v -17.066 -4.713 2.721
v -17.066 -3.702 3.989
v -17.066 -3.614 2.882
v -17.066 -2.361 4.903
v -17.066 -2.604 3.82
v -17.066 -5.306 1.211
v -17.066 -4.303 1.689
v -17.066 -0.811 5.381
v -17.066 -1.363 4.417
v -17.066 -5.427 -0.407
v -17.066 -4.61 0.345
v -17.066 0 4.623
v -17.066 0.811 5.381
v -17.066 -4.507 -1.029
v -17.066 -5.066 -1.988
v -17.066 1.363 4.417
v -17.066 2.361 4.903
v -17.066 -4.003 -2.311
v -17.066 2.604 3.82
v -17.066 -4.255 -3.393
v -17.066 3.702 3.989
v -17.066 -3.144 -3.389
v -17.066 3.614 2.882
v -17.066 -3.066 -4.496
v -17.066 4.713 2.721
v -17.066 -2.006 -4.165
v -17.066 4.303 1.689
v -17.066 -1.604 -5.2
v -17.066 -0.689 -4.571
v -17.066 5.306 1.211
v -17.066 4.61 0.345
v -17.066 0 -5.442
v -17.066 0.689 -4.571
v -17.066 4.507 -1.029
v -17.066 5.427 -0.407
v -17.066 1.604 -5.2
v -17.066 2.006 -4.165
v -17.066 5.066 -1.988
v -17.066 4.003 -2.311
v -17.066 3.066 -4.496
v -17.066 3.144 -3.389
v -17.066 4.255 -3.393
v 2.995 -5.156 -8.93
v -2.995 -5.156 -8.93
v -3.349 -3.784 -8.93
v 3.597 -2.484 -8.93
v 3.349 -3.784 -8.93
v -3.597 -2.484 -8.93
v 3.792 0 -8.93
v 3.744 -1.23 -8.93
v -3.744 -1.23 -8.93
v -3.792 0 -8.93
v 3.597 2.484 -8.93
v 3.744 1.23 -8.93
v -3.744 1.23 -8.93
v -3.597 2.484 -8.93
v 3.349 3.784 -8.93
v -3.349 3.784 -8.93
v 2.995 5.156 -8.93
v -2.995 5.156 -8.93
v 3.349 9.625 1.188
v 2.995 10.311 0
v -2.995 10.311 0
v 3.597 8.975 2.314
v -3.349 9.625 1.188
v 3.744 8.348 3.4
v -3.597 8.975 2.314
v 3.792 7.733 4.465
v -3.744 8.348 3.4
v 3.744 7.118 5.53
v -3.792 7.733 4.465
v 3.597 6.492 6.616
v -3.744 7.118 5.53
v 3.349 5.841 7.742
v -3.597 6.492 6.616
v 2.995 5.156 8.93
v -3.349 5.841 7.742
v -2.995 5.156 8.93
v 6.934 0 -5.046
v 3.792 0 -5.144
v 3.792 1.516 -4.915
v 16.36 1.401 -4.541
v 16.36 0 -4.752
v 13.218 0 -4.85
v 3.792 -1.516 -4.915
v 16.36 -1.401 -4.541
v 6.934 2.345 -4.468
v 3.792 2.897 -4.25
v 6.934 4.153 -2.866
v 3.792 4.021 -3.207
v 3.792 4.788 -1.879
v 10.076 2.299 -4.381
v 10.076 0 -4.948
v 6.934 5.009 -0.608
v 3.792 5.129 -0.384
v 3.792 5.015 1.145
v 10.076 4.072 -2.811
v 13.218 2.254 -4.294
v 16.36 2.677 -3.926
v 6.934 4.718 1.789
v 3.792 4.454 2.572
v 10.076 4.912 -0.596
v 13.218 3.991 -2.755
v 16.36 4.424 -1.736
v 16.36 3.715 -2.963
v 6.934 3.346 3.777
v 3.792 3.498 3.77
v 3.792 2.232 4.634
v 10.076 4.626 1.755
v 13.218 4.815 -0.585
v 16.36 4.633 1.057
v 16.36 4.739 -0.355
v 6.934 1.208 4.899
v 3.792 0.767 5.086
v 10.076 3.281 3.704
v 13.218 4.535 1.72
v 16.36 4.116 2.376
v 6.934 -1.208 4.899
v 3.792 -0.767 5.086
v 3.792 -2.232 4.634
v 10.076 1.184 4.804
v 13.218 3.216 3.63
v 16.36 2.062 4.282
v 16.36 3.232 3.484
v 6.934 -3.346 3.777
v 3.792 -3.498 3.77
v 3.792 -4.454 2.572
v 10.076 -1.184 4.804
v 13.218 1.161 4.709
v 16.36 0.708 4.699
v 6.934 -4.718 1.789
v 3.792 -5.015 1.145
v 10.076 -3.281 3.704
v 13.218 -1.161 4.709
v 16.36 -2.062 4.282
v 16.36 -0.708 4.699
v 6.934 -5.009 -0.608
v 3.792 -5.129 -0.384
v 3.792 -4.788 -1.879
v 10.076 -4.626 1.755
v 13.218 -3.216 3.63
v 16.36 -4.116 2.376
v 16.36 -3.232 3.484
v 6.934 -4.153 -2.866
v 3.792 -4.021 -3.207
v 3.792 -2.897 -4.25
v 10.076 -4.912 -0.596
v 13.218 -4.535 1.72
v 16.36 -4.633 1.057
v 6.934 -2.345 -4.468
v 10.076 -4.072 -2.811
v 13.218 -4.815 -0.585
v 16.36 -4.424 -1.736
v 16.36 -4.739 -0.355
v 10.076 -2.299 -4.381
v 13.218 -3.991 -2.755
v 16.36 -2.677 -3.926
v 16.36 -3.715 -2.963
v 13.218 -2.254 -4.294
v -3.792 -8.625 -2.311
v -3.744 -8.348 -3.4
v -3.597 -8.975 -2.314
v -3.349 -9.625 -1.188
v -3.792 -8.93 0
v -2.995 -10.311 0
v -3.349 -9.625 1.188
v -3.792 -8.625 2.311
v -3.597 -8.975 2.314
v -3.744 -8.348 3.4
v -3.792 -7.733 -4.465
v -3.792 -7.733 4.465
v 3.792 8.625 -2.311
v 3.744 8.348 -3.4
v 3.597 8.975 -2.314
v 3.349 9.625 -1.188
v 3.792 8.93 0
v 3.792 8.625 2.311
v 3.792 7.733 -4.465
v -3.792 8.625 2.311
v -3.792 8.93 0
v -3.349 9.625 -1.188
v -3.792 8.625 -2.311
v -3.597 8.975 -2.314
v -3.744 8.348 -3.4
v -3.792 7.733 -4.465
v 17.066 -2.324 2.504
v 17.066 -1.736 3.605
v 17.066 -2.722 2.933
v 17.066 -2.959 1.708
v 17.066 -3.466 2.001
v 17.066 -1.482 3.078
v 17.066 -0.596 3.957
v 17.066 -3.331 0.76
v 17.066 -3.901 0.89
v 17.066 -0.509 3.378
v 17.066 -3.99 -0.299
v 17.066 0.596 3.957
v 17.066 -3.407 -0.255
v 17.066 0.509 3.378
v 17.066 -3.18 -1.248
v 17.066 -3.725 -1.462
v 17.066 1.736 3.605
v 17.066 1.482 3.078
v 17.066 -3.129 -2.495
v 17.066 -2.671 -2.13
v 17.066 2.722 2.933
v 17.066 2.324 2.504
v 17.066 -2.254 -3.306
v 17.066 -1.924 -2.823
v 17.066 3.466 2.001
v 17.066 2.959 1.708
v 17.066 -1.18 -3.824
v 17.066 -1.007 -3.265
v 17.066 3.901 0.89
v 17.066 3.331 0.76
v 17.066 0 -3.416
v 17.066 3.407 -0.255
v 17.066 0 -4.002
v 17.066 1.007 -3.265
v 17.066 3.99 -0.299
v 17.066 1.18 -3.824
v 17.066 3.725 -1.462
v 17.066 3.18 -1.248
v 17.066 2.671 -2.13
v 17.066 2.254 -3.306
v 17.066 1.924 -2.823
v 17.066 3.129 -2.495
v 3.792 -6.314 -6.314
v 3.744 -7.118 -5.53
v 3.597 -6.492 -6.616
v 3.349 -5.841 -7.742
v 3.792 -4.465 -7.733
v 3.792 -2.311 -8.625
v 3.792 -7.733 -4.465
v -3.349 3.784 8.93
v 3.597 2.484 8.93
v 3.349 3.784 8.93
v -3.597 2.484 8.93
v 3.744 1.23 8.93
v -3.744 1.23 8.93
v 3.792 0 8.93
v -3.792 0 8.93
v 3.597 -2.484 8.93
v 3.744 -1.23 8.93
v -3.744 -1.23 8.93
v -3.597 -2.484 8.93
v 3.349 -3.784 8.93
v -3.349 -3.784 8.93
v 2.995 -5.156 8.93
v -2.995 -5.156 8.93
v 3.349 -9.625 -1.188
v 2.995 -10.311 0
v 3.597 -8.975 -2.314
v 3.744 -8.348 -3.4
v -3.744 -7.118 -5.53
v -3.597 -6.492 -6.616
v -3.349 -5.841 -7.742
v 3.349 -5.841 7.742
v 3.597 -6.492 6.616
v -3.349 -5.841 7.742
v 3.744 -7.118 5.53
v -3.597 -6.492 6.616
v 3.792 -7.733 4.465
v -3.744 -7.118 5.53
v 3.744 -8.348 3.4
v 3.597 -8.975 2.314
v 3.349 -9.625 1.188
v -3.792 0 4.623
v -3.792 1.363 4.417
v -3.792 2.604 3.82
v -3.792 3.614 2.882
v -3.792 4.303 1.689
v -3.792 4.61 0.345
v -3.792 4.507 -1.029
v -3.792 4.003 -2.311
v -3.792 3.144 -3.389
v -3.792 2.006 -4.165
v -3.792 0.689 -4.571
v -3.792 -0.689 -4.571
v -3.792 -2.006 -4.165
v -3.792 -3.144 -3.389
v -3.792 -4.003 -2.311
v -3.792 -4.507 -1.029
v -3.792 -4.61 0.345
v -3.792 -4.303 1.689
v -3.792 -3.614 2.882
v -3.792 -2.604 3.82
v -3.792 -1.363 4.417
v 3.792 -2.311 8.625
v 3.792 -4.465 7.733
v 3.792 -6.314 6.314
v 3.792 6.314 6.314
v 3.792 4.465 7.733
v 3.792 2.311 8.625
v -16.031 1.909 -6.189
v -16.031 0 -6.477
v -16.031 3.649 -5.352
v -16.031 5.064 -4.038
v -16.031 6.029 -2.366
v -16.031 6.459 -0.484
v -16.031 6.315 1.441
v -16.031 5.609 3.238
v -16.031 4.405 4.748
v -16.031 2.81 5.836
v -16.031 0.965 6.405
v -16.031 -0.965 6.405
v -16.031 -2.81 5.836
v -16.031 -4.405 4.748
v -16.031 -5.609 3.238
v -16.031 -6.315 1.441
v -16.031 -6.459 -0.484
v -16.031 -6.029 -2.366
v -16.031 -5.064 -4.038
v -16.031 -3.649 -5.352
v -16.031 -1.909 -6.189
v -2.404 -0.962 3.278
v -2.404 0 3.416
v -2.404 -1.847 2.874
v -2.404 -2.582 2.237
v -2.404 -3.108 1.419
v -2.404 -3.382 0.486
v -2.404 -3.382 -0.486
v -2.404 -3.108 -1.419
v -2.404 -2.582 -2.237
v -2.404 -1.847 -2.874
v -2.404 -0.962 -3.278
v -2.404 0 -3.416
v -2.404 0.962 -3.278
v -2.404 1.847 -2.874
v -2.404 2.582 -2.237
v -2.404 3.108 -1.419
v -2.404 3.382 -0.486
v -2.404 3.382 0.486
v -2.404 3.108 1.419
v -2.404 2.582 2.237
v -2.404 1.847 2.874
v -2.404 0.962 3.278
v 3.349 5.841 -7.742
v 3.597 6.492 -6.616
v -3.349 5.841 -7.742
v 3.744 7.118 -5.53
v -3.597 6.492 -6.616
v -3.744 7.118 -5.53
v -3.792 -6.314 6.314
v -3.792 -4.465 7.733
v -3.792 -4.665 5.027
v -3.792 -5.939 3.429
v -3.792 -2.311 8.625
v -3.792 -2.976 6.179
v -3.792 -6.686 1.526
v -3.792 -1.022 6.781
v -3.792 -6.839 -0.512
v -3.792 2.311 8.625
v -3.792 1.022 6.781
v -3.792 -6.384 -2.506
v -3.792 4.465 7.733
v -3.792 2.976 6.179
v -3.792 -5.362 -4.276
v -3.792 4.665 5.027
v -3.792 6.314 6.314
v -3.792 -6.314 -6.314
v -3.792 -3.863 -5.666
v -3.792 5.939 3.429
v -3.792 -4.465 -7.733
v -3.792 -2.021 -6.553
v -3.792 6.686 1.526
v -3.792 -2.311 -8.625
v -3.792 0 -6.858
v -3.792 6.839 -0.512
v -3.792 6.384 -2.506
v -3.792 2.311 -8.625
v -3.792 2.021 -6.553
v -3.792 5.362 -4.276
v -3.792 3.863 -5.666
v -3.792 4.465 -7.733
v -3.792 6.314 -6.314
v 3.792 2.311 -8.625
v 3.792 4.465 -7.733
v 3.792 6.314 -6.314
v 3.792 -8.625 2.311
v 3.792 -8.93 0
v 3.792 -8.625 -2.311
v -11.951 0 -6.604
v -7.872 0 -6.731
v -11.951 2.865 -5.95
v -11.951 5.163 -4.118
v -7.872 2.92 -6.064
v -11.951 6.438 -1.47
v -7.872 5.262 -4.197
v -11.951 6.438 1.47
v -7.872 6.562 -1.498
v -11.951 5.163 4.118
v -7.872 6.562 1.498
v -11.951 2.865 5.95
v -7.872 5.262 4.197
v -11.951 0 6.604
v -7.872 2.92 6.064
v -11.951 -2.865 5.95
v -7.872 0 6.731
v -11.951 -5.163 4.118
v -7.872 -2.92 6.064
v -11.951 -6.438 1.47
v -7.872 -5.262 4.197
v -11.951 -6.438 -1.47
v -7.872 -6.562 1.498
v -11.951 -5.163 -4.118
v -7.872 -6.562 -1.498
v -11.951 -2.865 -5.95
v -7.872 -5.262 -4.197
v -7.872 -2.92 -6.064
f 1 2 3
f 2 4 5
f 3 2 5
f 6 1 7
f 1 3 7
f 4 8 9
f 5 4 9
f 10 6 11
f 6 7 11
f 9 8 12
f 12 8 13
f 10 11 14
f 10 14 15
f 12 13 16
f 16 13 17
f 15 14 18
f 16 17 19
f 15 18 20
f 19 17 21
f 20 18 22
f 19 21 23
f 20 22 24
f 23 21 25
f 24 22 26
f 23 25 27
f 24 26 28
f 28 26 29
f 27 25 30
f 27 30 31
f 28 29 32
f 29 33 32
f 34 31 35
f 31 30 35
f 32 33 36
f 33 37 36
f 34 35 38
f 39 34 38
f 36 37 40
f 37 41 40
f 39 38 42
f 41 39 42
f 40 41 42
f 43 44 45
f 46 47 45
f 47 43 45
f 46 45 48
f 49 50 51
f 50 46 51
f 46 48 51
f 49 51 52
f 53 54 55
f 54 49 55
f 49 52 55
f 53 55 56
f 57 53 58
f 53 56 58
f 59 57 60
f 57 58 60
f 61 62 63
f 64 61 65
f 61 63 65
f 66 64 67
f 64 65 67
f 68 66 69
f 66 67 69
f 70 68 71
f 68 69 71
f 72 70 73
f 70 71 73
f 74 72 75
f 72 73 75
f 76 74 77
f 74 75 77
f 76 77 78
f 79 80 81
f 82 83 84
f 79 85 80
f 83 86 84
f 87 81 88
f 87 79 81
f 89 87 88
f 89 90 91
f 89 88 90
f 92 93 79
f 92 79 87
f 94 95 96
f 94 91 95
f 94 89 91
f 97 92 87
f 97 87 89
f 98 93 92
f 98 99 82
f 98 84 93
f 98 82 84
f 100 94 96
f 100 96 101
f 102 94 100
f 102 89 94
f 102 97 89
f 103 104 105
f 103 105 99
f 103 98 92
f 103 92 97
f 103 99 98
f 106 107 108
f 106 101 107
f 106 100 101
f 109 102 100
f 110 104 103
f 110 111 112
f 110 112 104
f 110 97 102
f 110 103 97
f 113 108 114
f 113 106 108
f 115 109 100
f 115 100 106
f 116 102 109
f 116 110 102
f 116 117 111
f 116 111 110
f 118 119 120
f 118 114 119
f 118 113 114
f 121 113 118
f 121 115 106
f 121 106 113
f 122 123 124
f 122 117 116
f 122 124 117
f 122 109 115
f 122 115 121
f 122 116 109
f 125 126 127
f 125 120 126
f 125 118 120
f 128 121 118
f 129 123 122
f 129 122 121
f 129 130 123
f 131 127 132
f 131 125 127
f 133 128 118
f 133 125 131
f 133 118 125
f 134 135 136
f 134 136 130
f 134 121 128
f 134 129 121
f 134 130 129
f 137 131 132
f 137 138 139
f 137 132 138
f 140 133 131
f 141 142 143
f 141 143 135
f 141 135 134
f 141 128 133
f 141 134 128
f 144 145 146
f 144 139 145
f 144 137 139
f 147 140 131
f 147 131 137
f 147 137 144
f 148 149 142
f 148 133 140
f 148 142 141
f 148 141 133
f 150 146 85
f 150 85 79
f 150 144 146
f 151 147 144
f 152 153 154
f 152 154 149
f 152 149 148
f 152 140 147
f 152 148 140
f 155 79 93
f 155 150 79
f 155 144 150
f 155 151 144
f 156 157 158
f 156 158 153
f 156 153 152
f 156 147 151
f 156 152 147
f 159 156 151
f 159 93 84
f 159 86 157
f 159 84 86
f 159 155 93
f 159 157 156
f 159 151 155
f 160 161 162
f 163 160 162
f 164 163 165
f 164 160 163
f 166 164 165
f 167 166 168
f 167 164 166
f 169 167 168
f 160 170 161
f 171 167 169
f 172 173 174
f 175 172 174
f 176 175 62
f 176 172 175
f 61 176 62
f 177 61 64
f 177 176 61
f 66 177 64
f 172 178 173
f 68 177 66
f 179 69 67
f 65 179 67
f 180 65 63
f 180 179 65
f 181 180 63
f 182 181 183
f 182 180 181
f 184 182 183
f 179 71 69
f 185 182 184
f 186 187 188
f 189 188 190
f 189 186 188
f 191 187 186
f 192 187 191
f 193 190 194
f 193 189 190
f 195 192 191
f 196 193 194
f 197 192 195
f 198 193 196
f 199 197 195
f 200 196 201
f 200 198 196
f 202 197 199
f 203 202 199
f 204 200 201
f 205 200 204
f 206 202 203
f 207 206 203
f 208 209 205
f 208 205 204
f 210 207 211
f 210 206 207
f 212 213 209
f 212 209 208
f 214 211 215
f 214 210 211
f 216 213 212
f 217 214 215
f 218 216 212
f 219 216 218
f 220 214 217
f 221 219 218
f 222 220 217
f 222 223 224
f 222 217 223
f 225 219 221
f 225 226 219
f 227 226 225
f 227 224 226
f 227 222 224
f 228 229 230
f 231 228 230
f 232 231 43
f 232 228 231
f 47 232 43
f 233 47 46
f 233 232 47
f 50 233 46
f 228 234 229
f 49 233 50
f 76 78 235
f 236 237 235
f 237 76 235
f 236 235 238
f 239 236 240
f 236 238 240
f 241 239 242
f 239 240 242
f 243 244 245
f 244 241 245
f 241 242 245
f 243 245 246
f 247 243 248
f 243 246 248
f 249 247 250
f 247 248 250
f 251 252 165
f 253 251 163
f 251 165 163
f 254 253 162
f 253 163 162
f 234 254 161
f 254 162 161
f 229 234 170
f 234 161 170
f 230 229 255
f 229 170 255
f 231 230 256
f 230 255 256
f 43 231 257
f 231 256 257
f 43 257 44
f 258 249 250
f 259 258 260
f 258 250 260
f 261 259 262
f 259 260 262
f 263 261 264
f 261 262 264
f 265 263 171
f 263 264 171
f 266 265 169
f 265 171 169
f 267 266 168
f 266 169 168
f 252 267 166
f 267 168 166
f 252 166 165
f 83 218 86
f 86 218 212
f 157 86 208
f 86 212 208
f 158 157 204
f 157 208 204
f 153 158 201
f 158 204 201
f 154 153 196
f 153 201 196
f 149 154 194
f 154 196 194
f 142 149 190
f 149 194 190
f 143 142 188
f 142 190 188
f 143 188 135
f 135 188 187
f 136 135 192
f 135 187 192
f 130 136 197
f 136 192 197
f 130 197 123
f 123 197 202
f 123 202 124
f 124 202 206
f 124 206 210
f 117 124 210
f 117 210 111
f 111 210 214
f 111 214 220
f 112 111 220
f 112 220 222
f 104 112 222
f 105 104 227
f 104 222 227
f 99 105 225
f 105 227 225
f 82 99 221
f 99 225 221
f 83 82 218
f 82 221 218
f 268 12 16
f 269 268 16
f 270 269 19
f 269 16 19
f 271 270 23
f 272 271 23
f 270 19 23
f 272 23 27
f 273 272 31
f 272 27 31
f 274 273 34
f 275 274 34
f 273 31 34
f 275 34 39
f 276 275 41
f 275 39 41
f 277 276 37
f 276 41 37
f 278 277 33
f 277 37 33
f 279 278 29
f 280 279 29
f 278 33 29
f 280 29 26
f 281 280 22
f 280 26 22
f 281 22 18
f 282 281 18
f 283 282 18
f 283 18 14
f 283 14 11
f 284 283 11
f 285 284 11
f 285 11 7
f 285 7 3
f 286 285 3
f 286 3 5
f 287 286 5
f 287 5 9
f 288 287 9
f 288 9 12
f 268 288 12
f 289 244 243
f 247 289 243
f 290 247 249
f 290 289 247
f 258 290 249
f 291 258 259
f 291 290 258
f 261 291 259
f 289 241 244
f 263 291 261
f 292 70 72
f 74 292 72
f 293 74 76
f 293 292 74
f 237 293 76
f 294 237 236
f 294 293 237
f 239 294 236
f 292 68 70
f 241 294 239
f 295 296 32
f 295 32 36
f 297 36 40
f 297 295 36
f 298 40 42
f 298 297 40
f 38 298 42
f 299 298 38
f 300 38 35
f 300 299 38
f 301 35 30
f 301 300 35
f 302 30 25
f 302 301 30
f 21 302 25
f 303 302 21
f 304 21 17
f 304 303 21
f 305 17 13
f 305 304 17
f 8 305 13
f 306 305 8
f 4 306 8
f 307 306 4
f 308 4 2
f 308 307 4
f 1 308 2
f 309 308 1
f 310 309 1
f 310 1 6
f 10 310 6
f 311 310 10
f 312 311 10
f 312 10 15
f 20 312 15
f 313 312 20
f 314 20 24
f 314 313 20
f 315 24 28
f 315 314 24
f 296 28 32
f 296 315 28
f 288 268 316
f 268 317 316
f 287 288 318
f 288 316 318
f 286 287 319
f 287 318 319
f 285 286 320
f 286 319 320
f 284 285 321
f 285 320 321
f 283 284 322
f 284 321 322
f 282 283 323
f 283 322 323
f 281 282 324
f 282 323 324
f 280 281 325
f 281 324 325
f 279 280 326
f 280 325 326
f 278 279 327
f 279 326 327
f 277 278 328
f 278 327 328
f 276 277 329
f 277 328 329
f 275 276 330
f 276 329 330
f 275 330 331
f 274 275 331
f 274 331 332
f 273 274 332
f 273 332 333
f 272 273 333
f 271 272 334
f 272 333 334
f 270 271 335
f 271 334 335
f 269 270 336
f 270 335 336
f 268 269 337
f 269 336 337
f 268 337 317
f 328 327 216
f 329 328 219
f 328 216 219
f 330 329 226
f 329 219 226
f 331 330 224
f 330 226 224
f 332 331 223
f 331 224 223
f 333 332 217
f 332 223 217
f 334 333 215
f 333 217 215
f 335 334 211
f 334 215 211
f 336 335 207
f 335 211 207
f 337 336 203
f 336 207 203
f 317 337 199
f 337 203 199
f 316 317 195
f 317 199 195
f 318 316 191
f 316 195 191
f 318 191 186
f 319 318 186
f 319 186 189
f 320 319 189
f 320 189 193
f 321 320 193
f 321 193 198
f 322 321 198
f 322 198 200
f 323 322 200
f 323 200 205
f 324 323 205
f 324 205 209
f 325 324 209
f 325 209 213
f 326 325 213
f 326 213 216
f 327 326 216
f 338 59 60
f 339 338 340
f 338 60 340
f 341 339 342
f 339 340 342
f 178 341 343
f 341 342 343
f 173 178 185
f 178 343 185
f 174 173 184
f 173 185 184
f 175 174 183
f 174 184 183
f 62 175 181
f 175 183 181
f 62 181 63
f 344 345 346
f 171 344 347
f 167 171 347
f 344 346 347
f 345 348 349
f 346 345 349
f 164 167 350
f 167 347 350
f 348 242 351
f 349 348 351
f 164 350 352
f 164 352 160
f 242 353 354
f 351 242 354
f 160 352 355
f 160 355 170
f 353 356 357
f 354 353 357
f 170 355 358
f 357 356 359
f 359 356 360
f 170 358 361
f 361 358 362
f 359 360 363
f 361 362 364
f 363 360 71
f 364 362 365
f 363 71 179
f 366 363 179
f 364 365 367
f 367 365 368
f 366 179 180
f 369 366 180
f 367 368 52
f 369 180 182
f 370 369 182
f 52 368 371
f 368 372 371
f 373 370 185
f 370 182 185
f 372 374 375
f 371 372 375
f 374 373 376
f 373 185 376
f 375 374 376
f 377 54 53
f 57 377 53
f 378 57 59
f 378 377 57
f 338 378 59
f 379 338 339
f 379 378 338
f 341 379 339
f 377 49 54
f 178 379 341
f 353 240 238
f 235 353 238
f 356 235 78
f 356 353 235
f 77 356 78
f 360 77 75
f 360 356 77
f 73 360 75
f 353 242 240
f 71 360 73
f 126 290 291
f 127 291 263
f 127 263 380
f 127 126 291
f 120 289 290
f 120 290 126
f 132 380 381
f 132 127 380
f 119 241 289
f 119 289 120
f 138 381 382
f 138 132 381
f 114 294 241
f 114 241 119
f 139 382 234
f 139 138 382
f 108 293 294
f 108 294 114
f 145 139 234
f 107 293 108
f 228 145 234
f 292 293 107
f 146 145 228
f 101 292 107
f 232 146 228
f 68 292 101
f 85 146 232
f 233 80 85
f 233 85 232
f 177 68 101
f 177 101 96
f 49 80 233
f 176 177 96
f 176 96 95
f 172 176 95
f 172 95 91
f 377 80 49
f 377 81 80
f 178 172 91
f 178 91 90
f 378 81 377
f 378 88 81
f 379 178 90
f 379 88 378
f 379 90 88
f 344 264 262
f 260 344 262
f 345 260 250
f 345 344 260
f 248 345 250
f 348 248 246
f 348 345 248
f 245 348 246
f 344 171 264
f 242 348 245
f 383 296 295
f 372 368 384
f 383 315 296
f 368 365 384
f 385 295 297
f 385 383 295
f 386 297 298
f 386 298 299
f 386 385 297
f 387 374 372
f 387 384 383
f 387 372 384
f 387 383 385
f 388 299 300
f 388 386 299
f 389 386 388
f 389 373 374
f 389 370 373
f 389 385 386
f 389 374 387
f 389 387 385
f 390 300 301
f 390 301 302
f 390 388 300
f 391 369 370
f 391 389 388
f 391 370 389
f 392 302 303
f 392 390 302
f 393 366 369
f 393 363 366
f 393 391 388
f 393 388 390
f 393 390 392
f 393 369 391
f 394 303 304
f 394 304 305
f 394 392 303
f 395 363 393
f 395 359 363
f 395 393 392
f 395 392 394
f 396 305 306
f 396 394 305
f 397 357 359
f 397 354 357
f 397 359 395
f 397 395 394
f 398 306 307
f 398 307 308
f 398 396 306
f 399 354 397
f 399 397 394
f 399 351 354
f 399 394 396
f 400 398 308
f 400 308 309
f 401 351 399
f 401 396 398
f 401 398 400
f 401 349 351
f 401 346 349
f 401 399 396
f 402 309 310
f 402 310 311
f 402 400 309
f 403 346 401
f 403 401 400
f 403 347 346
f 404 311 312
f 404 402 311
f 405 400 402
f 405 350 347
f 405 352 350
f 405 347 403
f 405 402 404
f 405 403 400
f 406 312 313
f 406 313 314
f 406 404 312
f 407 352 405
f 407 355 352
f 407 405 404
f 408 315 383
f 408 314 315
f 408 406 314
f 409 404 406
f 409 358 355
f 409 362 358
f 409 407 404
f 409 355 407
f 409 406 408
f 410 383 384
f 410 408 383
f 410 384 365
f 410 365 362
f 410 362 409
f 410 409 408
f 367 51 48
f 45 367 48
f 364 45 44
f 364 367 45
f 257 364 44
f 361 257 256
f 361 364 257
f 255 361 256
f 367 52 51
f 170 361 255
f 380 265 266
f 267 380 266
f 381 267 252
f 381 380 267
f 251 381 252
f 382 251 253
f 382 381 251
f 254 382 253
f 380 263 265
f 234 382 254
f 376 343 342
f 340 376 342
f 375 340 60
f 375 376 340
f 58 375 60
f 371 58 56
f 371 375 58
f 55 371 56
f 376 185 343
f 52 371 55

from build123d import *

# Parameters (mm, degrees)
SKETCH2_R           = 6.858
EXTRUDE1_DEPTH      = 13.273264
EXTRUDE1_DRAFT      = -1.783333333
CHAMFER1_SIZE       = 1.002631579
CHAMFER1_SIZE2      = 1.035353254
SKETCH5_R           = 5.1435
EXTRUDE2_DEPTH      = 13.273264
EXTRUDE2_TAPER      = 1.783333333
CHAMFER2_SIZE       = 0.705555556
CHAMFER2_SIZE_2     = 0.728581919
EXTRUDE3_DEPTH      = 3.792361
EXTRUDE3_DEPTH_BACK = 3.792361
SKETCH10_OUTSIDE_W  = 118.396
SKETCH10_OUTSIDE_H  = 121.158
SKETCH10_OUTSIDE_R  = 8.9296875
CUT_EXTRUDE1_DEPTH  = 25.922158813
CUT_EXTRUDE1_DRAFT  = -60
SKETCH11_OUTSIDE_W  = 118.396
SKETCH11_OUTSIDE_H  = 121.158
SKETCH11_OUTSIDE_R  = 8.9296875
CUT_EXTRUDE2_DEPTH  = 25.922158813
CUT_EXTRUDE2_DRAFT  = -60
SKETCH12_R          = 4.6228
CUT_EXTRUDE3_DEPTH  = 13.273265
SKETCH13_R          = 3.4163
CUT_EXTRUDE4_DEPTH  = 37.75596067


with BuildPart() as part:
    # Sketch2 → Extrude1 (with draft: the straight prism first)
    with BuildSketch(Plane(origin=(-3.792361111, 0, 0), x_dir=(0, 0, -1), z_dir=(1, 0, 0))):
        Circle(SKETCH2_R)
    extrude(amount=-EXTRUDE1_DEPTH)
    # Extrude1: the draft: its side faces are tilted about the plane it starts from
    extrude1_sides = [part.faces().sort_by_distance(p)[0] for p in [
        (-10.428993111, 0, 6.858),
    ]]
    draft(extrude1_sides, Plane(origin=(-3.792361111, 0, 0), x_dir=(0, 0, -1), z_dir=(1, 0, 0)), EXTRUDE1_DRAFT)

    # Chamfer1
    chamfer1_edges = [part.edges().sort_by_distance(p)[0] for p in [
        (-17.065625111, 0, 6.444735688),
    ]]
    chamfer1_side = [part.faces().sort_by_distance(p)[0] for p in [
        (-17.065625111, 0, 0),
    ]]
    chamfer(chamfer1_edges, length=CHAMFER1_SIZE, length2=CHAMFER1_SIZE2, reference=chamfer1_side[0])



with BuildPart() as body_2:
    # Sketch5 → Extrude2 (new body)
    with BuildSketch(Plane(origin=(3.792361111, 0, 0), x_dir=(0, 0, -1), z_dir=(1, 0, 0))):
        Circle(SKETCH5_R)
    extrude(amount=EXTRUDE2_DEPTH, taper=EXTRUDE2_TAPER)

    # Chamfer2
    # the kernel refuses this chamfer: 0.728581919, 0.705555556 mm, written as the material it takes off along each edge
    with BuildSketch(Plane(origin=(17.065625111, 0, 0), x_dir=(0, 0, -1), z_dir=(0, 1, 0))) as chamfer2_piece_1:
        Polygon((4.730235688 + CHAMFER2_SIZE * 0.0311200130608, CHAMFER2_SIZE * 0.999515654468), (4.730235688 - CHAMFER2_SIZE_2, 0), (4.730235688, 0), align=None)
    revolve(axis=Axis((17.065625111, 0, 0), (-1, 0, 0)), mode=Mode.SUBTRACT)


with BuildPart() as part_1:
    add(part.part)

    add(body_2.part)  # Revolve1 merges body 2
    # Sketch8 → Revolve1 (revolve)
    with BuildSketch(Plane.XY, mode=Mode.PRIVATE) as revolve1_sk:
        Polygon((0, 6.858), (-3.792361111, 6.858), (-10.476571637, 5.066971187), (-10.476571637, 0), (10.476571637, 0), (10.476571637, 3.352471187), (3.792361111, 5.1435), (0, 5.1435), align=None)
    revolve(revolve1_sk.sketch.rotate(Axis((-17.065625, 0, 0), (1, 0, 0)), 90), axis=Axis((-17.065625, 0, 0), (1, 0, 0)))

    # Sketch9 → Extrude3 (add, two sides: drawn at the far end of the back side and taken through both)
    with BuildSketch(Plane(origin=(0, 0, 0), x_dir=(0, 0, -1), z_dir=(1, 0, 0)).offset(-EXTRUDE3_DEPTH_BACK)):
        Polygon((0, 10.311114964), (-8.9296875, 5.155557482), (-8.9296875, -5.155557482), (0, -10.311114964), (8.9296875, -5.155557482), (8.9296875, 5.155557482), align=None)
    extrude(amount=EXTRUDE3_DEPTH + EXTRUDE3_DEPTH_BACK)


with BuildPart() as cut_extrude1_tool:
    # Sketch10 outside → Cut-Extrude1 (with draft: the straight prism first)
    with BuildSketch(Plane(origin=(3.792361111, 0, 0), x_dir=(0, 0, -1), z_dir=(1, 0, 0))):
        Rectangle(SKETCH10_OUTSIDE_W, SKETCH10_OUTSIDE_H)
        Circle(SKETCH10_OUTSIDE_R, mode=Mode.SUBTRACT)
    extrude(amount=-CUT_EXTRUDE1_DEPTH)
    # Cut-Extrude1: the draft: its side faces are tilted about the plane it starts from
    cut_extrude1_sides = [cut_extrude1_tool.faces().sort_by_distance(p)[0] for p in [
        (-9.168718295, -60.579, 0),
        (-9.168718295, 0, -59.198),
        (-9.168718295, 60.579, 0),
        (-9.168718295, 0, 59.198),
        (-9.168718295, 0, 8.9296875),
    ]]
    draft(cut_extrude1_sides, Plane(origin=(3.792361111, 0, 0), x_dir=(0, 0, -1), z_dir=(1, 0, 0)), CUT_EXTRUDE1_DRAFT)


with BuildPart() as part_2:
    add(part_1.part)

    # Cut-Extrude1: cut by cut_extrude1_tool
    add(cut_extrude1_tool.part, mode=Mode.SUBTRACT)


with BuildPart() as cut_extrude2_tool:
    # Sketch11 outside → Cut-Extrude2 (with draft: the straight prism first)
    with BuildSketch(Plane.ZY.offset(3.792361111)):
        Rectangle(SKETCH11_OUTSIDE_W, SKETCH11_OUTSIDE_H)
        Circle(SKETCH11_OUTSIDE_R, mode=Mode.SUBTRACT)
    extrude(amount=-CUT_EXTRUDE2_DEPTH)
    # Cut-Extrude2: the draft: its side faces are tilted about the plane it starts from
    cut_extrude2_sides = [cut_extrude2_tool.faces().sort_by_distance(p)[0] for p in [
        (9.168718295, -60.579, 0),
        (9.168718295, 0, 59.198),
        (9.168718295, 60.579, 0),
        (9.168718295, 0, -59.198),
        (9.168718295, 0, -8.9296875),
    ]]
    draft(cut_extrude2_sides, Plane.ZY.offset(3.792361111), CUT_EXTRUDE2_DRAFT)


with BuildPart() as part_3:
    add(part_2.part)

    # Cut-Extrude2: cut by cut_extrude2_tool
    add(cut_extrude2_tool.part, mode=Mode.SUBTRACT)

    # Sketch12 → Cut-Extrude3 (cut)
    with BuildSketch(Plane.ZY.offset(17.065625)):
        Circle(SKETCH12_R)
    extrude(amount=-CUT_EXTRUDE3_DEPTH, mode=Mode.SUBTRACT)

    # Sketch13 → Cut-Extrude4 (cut, through all)
    with BuildSketch(Plane(origin=(17.065625, 0, 0), x_dir=(0, 0, -1), z_dir=(1, 0, 0))):
        Circle(SKETCH13_R)
    extrude(amount=-CUT_EXTRUDE4_DEPTH, mode=Mode.SUBTRACT)

    # Cut-Extrude5 cone 1 section (through the dimple's axis) → Cut-Extrude5 (revolve, cut)
    with BuildSketch(Plane(origin=(-3.792361111, 0, 0), x_dir=(0, 0, 1), z_dir=(0, 1, 0))):
        Polygon((0, 0), (4.6228, 0), (0, 5.317923073), align=None)
    revolve(axis=Axis((-3.792361111, 0, 0), (1, 0, 0)), mode=Mode.SUBTRACT)


solid = part_3.part
